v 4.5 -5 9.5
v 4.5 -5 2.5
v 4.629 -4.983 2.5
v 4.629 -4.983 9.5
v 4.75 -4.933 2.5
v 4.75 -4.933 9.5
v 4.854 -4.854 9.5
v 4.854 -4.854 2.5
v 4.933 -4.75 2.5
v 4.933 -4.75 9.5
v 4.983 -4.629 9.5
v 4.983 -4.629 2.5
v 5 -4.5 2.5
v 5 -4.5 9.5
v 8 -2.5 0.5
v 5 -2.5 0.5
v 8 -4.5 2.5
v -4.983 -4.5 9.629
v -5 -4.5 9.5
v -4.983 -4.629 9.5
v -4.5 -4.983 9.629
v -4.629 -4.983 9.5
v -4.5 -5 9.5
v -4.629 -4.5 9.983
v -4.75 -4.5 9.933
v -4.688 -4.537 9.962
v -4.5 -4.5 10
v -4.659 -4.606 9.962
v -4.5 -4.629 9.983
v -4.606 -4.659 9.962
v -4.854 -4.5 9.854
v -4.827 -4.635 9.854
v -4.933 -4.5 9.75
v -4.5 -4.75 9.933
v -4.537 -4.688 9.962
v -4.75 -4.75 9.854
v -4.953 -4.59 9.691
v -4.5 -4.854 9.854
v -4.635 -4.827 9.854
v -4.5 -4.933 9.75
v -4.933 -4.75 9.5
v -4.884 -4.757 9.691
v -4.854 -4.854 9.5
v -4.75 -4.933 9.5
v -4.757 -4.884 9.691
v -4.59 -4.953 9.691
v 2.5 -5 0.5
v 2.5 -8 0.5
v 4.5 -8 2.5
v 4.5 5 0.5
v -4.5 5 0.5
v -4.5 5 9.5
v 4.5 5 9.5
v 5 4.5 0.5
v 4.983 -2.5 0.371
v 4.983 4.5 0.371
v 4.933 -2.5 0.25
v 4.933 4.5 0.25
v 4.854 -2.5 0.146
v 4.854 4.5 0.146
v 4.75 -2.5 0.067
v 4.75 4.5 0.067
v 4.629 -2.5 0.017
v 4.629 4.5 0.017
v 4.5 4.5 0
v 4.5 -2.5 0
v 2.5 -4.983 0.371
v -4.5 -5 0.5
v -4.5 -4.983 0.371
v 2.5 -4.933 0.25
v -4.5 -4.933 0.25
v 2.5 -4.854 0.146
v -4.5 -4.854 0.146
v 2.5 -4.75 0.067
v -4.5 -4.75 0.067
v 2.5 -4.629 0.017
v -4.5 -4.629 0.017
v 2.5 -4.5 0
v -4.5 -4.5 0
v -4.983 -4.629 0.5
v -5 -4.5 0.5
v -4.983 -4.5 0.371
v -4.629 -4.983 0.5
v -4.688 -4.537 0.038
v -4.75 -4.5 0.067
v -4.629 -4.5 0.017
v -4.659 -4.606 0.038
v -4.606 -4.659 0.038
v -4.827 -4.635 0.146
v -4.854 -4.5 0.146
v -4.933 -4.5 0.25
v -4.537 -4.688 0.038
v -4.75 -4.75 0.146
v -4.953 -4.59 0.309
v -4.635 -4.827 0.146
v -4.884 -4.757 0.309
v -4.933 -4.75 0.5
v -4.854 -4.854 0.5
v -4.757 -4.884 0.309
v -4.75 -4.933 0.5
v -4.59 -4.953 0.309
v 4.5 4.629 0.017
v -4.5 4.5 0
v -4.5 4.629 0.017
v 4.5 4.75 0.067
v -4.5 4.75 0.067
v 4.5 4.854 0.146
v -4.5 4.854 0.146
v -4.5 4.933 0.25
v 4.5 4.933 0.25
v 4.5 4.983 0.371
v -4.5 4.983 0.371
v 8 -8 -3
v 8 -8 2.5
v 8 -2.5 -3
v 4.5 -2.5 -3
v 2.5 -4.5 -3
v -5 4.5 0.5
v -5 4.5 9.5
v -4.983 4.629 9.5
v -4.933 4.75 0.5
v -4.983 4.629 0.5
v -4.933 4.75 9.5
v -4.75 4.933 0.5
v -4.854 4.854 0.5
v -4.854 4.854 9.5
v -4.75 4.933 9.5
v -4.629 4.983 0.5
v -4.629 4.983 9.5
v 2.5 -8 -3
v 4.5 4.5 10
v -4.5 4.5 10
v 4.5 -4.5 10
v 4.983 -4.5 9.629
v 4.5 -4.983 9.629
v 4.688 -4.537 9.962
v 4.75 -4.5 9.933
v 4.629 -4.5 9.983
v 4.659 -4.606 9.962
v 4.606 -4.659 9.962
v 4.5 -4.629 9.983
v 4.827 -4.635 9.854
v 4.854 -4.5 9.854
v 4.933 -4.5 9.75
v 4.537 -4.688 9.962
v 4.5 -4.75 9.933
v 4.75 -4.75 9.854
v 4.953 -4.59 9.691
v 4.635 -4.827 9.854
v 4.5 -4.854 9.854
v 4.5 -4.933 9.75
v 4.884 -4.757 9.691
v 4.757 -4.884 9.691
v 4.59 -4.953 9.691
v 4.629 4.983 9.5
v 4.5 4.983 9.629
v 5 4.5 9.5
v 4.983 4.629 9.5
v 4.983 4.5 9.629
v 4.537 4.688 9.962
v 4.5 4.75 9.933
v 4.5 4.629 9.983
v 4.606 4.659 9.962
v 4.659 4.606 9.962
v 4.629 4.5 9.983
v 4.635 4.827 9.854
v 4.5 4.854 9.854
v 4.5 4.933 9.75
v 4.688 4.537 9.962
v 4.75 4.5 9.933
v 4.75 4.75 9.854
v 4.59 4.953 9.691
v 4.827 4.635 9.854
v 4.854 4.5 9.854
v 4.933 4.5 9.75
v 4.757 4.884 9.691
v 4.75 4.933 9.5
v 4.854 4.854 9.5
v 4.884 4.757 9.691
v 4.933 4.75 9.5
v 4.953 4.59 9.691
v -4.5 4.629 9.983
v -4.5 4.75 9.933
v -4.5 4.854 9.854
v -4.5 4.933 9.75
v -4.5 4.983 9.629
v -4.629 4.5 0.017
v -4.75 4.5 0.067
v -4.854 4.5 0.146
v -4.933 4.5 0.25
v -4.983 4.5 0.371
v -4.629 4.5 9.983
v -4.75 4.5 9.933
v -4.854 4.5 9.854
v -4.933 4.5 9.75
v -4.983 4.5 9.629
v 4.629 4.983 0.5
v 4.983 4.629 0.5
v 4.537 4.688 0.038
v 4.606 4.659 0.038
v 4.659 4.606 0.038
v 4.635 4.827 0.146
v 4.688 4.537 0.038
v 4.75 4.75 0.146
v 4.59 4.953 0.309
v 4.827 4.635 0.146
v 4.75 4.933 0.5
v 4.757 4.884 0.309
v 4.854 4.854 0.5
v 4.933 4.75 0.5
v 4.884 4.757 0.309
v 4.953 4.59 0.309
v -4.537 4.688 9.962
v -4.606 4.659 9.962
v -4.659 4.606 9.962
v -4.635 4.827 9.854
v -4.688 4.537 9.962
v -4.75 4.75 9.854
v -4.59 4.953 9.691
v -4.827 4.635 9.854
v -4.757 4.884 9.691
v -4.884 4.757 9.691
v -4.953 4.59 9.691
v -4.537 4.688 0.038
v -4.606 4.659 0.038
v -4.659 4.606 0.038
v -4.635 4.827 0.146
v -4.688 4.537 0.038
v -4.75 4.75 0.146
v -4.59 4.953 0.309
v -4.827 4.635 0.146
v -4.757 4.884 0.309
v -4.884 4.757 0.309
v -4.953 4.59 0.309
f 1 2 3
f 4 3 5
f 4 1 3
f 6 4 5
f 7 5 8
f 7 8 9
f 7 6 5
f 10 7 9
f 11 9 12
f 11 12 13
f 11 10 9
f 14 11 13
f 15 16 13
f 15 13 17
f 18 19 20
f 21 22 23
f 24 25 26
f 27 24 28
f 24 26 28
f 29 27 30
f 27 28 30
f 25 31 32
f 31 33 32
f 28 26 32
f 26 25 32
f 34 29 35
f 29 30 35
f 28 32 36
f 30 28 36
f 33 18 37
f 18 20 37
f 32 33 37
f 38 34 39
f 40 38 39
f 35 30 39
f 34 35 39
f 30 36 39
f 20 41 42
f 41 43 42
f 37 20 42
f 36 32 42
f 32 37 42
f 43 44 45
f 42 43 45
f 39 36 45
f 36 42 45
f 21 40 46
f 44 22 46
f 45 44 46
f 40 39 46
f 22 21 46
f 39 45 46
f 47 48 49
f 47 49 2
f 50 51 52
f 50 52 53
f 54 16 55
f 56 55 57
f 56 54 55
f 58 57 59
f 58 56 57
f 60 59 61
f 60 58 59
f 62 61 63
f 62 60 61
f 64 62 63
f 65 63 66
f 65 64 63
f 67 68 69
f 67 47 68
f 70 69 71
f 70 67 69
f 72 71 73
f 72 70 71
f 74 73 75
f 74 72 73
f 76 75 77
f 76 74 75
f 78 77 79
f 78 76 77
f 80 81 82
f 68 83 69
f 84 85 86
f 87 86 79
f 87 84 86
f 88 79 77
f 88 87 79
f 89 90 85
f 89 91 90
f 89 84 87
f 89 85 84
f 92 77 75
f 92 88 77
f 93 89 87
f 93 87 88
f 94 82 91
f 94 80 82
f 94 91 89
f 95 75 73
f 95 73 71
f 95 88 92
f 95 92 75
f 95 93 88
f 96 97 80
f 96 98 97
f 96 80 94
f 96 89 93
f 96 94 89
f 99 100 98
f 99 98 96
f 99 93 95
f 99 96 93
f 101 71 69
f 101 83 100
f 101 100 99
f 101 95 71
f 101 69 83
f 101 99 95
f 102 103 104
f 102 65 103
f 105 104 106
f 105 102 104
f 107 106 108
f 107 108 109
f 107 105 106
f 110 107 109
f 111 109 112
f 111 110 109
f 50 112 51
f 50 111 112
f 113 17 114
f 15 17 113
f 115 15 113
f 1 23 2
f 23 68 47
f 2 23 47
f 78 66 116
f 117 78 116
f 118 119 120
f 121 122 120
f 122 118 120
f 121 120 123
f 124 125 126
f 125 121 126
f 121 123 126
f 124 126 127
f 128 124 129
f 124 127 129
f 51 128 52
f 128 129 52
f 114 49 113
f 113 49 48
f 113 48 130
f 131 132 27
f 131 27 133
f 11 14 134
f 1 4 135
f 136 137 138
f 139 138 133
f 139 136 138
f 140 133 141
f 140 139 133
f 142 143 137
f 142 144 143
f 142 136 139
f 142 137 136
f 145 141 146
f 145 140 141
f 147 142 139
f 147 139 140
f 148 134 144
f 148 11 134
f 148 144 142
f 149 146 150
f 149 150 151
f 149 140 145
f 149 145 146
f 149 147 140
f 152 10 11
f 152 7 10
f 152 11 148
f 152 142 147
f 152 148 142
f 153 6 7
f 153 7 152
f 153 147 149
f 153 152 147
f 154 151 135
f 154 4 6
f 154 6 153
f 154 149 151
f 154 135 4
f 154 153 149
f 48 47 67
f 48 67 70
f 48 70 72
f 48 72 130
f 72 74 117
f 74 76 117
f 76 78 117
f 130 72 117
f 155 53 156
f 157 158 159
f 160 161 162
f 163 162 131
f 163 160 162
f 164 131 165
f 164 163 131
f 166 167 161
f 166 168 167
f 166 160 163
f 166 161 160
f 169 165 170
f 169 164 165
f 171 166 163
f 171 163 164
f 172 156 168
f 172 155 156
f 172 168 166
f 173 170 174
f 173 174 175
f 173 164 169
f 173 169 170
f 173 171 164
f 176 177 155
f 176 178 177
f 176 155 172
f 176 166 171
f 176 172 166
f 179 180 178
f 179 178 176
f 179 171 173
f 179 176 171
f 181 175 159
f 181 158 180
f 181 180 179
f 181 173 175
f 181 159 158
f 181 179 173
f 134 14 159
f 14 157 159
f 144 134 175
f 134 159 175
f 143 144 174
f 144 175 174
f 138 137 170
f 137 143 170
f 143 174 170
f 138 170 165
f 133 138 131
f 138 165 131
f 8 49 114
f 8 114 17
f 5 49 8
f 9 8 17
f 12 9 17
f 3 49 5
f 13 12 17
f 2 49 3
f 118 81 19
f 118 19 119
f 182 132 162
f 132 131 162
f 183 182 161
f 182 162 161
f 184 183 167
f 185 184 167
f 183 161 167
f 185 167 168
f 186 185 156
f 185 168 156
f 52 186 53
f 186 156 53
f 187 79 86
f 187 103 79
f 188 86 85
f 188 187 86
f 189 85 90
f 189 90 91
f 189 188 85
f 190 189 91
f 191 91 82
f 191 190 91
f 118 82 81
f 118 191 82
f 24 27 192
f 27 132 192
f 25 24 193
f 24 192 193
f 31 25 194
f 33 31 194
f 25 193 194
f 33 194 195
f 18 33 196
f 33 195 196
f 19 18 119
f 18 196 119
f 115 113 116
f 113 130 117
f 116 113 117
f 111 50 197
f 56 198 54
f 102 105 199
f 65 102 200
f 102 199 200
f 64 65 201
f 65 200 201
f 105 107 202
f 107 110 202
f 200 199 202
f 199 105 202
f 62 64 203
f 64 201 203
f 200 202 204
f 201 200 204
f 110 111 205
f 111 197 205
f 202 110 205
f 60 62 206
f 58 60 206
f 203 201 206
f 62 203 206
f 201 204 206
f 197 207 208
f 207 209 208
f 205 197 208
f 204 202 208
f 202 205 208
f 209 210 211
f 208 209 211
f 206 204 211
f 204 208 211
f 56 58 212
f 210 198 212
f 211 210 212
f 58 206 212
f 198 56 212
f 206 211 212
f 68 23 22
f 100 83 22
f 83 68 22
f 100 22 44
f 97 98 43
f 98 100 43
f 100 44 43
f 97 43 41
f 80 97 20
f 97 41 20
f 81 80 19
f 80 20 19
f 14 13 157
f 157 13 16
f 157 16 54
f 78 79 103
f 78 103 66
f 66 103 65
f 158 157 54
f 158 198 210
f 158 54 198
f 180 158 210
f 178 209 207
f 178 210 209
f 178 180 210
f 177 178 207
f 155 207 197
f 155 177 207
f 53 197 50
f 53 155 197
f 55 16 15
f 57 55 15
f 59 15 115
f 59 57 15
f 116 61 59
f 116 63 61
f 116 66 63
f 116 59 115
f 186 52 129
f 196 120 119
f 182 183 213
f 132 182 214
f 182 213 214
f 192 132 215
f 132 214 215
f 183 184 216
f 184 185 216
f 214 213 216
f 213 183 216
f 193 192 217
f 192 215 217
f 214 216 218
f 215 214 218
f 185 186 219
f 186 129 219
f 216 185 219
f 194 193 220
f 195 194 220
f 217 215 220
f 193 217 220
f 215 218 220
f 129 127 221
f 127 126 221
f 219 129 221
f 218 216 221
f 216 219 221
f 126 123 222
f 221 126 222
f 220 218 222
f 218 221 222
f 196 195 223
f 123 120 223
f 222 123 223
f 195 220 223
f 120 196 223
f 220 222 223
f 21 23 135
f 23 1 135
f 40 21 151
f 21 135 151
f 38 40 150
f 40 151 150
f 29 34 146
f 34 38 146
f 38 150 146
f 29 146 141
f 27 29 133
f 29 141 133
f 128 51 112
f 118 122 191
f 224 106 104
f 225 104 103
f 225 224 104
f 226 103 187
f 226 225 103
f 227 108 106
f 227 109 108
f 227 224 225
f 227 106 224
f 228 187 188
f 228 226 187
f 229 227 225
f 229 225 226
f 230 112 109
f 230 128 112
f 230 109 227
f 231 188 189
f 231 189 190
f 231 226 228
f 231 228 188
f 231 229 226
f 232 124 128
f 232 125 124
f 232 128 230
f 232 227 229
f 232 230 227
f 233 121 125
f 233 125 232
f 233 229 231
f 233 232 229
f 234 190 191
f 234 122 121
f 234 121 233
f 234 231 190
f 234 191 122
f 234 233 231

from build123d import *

# Parameters (mm, degrees)
SKETCH1_W                = 10
SKETCH1_H                = 10
BASE_EXTRUDE_DEPTH       = 10
BOSS_EXTRUDE1_DEPTH      = 5
BOSS_EXTRUDE1_DEPTH_BACK = 0.5
SKETCH3_W                = 5.5
SKETCH3_H                = 5.5
FILLET2_R                = 0.5
CHAMFER4_SIZE            = 2


with BuildPart() as part:
    # Sketch1 → Base-Extrude (new body)
    with BuildSketch(Plane.XY):
        Rectangle(SKETCH1_W, SKETCH1_H)
    extrude(amount=BASE_EXTRUDE_DEPTH)

    # Sketch3 → Boss-Extrude1 (add, two sides: drawn at the far end of the back side and taken through both)
    with BuildSketch(Plane(origin=(3, 0, 0), x_dir=(0, 0, -1), z_dir=(1, 0, 0)).offset(-BOSS_EXTRUDE1_DEPTH_BACK)):
        with Locations((0.25, -5.25)):
            Rectangle(SKETCH3_W, SKETCH3_H)
    extrude(amount=BOSS_EXTRUDE1_DEPTH + BOSS_EXTRUDE1_DEPTH_BACK)

    # Fillet2
    fillet2_edges = [part.edges().sort_by_distance(p)[0] for p in [
        (-5, 5, 5),
        (5, 5, 5),
        (0, 5, 0),
        (0, 5, 10),
        (-5, -5, 5),
        (-5, 0, 0),
        (-5, 0, 10),
        (5, 1.25, 0),
        (5, -5, 6.25),
        (5, 0, 10),
        (-1.25, -5, 0),
        (0, -5, 10),
    ]]
    fillet(fillet2_edges, radius=FILLET2_R)

    # Chamfer4
    chamfer4_edges = [part.edges().sort_by_distance(p)[0] for p in [
        (2.5, -2.5, -1.5),
        (2.5, -6.5, 2.5),
        (6.5, -2.5, 2.5),
    ]]
    chamfer(chamfer4_edges, length=CHAMFER4_SIZE)


solid = part.part
